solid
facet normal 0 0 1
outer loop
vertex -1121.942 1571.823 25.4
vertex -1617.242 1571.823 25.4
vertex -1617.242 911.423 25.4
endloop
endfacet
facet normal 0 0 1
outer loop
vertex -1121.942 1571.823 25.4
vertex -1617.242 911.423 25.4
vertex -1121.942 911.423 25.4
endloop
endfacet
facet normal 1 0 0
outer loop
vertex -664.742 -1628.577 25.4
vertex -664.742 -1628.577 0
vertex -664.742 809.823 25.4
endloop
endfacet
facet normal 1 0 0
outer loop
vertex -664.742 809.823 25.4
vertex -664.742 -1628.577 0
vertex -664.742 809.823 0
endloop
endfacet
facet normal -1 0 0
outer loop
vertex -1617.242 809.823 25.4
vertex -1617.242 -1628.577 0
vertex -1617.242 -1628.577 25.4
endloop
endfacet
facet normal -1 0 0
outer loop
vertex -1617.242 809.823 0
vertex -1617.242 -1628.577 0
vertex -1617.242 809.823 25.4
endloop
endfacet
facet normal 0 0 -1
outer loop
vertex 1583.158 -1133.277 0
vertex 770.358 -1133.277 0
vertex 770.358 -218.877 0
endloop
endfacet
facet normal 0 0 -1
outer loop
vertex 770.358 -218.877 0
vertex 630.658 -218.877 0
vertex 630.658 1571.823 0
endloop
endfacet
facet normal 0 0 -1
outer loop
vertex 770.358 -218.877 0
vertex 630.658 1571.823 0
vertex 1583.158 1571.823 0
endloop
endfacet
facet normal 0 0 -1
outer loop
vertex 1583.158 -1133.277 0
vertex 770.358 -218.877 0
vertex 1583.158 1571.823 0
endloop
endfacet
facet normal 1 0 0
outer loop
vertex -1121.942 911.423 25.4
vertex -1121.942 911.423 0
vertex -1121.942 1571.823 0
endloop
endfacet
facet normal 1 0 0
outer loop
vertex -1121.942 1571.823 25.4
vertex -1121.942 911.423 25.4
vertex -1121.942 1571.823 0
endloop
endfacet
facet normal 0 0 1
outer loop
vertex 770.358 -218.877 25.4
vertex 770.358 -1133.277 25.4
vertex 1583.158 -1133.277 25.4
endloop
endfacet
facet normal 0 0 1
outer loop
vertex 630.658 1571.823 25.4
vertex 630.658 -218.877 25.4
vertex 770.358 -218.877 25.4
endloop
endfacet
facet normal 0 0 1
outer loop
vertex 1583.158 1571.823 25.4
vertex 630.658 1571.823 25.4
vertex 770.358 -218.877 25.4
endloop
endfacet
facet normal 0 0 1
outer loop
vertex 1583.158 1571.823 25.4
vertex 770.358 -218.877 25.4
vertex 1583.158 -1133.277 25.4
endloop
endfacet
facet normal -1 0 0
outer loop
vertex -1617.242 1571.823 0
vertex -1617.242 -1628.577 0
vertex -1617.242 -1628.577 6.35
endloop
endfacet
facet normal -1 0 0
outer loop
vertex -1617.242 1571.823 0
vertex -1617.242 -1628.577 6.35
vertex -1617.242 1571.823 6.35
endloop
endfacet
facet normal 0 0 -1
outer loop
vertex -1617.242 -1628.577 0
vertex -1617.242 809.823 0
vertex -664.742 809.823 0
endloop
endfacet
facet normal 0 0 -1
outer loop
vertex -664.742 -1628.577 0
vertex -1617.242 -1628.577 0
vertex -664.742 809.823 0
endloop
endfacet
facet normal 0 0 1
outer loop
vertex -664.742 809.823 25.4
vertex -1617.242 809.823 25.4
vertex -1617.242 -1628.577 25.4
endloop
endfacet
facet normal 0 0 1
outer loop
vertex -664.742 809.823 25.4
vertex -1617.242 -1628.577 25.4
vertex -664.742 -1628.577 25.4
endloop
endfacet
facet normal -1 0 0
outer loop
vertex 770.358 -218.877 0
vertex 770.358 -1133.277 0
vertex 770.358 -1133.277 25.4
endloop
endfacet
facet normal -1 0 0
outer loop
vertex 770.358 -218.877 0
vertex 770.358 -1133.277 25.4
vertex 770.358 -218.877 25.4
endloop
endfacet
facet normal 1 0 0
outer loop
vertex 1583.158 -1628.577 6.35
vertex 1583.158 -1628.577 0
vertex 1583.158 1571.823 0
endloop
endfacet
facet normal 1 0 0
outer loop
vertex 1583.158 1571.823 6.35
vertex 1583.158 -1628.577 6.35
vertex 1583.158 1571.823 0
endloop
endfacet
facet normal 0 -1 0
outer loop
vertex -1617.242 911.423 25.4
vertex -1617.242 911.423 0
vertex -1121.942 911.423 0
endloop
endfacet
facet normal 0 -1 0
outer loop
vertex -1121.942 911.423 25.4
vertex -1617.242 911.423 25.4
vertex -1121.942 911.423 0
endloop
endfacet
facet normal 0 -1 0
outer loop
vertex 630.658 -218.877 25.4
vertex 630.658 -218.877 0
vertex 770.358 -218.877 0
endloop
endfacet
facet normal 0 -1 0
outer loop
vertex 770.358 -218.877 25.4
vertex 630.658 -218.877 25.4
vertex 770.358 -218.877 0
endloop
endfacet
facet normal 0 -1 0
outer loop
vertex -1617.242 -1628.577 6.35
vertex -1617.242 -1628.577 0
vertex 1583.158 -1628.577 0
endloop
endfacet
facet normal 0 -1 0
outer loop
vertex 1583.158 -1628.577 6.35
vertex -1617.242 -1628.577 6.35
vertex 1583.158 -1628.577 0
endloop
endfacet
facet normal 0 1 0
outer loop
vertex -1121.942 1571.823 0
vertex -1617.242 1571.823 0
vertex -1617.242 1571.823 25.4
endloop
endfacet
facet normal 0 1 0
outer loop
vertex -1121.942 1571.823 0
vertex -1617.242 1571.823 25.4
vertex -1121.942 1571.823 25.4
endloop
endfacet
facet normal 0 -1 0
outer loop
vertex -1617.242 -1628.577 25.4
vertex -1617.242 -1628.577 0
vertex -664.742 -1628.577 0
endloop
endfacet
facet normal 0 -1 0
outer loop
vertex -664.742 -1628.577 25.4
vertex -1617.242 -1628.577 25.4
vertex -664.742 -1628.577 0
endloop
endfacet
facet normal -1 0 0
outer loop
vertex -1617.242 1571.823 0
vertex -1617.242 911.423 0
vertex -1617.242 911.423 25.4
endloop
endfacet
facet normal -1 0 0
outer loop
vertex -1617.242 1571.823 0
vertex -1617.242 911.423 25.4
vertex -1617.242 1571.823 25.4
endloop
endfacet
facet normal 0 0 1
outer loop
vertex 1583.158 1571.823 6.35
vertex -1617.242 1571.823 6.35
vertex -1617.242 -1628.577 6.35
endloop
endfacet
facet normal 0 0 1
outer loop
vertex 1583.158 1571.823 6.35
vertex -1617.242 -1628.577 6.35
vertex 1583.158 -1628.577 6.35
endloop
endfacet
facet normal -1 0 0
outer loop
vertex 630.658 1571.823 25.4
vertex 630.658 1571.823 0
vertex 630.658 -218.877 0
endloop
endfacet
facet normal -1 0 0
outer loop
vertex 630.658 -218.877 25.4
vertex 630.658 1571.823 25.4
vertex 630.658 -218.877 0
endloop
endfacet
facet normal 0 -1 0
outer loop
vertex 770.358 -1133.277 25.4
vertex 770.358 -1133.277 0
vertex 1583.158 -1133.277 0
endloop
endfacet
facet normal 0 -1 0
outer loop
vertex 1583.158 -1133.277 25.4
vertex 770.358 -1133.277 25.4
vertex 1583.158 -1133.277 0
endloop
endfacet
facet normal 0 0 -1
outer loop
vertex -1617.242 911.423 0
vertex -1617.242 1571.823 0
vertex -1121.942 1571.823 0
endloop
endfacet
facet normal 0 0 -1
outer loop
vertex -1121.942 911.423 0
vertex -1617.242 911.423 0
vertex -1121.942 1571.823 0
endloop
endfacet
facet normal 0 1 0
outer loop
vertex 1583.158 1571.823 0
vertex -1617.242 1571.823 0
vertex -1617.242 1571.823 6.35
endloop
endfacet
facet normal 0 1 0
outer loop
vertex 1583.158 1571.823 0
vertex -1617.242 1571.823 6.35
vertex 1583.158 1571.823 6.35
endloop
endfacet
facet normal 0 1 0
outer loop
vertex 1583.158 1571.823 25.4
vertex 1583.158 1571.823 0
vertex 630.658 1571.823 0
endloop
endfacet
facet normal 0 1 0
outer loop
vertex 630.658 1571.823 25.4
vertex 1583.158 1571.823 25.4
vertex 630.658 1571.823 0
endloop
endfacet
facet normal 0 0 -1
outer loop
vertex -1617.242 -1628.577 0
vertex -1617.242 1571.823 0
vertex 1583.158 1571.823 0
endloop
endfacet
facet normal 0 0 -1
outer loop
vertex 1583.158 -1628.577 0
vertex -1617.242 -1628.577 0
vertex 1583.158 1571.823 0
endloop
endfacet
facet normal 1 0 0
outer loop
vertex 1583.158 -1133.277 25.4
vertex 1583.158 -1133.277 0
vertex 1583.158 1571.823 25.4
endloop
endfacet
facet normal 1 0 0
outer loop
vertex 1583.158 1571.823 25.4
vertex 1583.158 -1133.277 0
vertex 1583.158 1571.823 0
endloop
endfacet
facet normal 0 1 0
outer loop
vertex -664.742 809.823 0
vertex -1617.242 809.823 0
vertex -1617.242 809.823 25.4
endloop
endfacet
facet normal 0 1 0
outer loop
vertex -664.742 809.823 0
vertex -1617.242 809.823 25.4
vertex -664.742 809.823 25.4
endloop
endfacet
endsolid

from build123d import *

# Parameters (mm, degrees)
F1_W     = 812.8
F1_H     = 914.4
F1_W_2   = 952.5
F1_H_2   = 2438.4
F1_W_3   = 495.3
F1_H_3   = 660.4
F2_DEPTH = 25.4
F0_W     = 3200.4
F0_H     = 3200.4
F3_DEPTH = 6.35


with BuildPart() as f2:
    # F1 (on face) → F2 (new body)
    with BuildSketch(Plane.XY):
        Polygon((1583.157545, 1571.823387), (630.657545, 1571.823387), (630.657545, -218.876613), (770.357545, -218.876613), (1583.157545, -218.876613), align=None)
        with Locations((1176.757545, -676.076613)):
            Rectangle(F1_W, F1_H)
        with Locations((-1140.992455, -409.376613)):
            Rectangle(F1_W_2, F1_H_2)
        with Locations((-1369.592455, 1241.623387)):
            Rectangle(F1_W_3, F1_H_3)
    extrude(amount=F2_DEPTH)


with BuildPart() as f3:
    # F0 (on Top) → F3 (new body)
    with BuildSketch(Plane.XY):
        with Locations((-17.042455, -28.376613)):
            Rectangle(F0_W, F0_H)
    extrude(amount=F3_DEPTH)


solid = Compound([f2.part, f3.part])
